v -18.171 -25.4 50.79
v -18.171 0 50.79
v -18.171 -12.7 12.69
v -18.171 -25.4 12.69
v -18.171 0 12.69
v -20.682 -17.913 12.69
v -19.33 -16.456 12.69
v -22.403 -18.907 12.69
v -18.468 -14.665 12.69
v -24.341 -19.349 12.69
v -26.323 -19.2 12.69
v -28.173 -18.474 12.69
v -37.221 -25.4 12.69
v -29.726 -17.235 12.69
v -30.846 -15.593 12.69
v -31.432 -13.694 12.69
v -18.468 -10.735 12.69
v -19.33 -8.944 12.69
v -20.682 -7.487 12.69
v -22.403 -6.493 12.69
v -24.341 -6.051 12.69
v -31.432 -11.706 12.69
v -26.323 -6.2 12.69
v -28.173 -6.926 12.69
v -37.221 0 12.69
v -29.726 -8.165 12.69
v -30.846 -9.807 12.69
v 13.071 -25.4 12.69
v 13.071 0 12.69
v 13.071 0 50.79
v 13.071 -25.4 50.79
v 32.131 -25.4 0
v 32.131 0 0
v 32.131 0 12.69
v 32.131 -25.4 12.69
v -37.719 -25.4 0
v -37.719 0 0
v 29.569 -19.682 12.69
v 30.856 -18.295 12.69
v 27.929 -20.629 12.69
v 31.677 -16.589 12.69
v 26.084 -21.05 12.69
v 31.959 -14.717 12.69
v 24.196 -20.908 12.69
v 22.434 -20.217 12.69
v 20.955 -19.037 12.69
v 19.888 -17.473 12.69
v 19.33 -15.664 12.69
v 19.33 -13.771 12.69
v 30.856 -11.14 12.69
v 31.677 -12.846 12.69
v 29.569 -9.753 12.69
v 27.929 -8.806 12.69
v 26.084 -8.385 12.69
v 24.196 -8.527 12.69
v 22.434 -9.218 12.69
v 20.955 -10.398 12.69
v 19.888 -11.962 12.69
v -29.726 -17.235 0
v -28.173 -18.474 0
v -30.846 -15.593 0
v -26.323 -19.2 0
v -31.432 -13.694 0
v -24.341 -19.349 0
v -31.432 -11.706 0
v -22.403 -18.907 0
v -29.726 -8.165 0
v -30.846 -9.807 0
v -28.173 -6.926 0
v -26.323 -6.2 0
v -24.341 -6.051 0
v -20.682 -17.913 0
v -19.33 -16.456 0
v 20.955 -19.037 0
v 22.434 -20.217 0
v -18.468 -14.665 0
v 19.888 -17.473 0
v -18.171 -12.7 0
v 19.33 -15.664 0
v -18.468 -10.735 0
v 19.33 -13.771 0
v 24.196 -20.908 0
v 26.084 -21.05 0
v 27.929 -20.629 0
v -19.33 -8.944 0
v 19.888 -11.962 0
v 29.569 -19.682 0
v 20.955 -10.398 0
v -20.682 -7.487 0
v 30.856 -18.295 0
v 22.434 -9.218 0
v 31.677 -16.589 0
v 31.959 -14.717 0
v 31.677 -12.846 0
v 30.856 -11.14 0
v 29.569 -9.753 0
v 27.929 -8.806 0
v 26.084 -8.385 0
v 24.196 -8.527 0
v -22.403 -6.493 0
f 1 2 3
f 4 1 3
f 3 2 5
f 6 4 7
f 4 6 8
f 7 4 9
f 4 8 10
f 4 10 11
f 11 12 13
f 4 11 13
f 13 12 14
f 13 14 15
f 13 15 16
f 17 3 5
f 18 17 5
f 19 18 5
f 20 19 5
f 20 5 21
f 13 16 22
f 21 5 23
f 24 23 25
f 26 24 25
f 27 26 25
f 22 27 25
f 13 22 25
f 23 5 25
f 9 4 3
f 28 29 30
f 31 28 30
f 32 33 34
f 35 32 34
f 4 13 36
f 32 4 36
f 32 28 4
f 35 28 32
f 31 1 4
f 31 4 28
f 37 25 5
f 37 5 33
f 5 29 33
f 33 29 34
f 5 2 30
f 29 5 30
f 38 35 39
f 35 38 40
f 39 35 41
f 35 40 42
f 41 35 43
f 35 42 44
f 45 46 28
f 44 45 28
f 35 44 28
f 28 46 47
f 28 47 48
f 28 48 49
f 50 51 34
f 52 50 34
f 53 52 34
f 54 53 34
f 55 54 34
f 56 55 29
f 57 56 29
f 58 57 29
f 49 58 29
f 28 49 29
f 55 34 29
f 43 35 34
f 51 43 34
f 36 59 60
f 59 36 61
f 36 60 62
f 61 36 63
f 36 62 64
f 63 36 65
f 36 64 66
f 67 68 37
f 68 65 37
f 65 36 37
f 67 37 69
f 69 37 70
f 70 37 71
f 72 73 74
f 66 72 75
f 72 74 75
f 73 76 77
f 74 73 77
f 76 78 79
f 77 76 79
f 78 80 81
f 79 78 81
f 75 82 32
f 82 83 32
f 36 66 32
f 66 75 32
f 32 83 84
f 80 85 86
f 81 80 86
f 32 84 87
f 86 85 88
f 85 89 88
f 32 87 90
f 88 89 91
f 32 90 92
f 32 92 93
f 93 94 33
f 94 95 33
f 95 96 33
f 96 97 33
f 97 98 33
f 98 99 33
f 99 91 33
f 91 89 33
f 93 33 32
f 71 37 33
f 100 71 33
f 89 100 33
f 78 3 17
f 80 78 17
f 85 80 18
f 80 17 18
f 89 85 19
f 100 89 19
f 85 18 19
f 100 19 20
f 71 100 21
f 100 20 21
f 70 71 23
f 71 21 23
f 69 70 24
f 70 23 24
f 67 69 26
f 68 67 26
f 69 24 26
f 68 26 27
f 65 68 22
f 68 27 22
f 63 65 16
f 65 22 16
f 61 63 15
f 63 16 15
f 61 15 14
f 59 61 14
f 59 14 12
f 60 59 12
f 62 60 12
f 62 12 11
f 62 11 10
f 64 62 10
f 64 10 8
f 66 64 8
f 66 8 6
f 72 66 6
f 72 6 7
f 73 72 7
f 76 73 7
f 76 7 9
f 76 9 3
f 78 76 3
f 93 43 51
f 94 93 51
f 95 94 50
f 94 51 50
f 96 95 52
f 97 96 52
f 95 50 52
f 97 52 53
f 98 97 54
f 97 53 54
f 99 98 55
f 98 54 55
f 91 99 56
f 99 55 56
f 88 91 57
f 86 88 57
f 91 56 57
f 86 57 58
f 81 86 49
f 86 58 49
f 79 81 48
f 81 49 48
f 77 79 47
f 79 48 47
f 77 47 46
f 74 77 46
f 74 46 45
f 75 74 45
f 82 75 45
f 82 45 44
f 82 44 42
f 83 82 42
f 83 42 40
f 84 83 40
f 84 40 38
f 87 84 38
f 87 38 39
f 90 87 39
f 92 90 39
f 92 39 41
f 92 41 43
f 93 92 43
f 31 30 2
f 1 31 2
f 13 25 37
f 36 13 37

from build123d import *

# Parameters (mm, degrees)
F1_DEPTH = 25.4
F2_R     = 6.6675
F3_DEPTH = 12.7
F4_R     = 6.35
F5_DEPTH = 12.7


with BuildPart() as f1:
    # F0 (on Front) → F1 (new body)
    with BuildSketch(Plane.XZ):
        Polygon((-37.221345, 12.690246), (-37.719001, 0), (32.130999, 0), (32.130999, 12.690246), (13.070659, 12.690246), (13.070659, 50.790246), (-18.171345, 50.790246), (-18.171345, 12.690246), align=None)
    extrude(amount=F1_DEPTH)

    # F2 (on face) → F3 (cut)
    with BuildSketch(Plane.XY.offset(12.690246)):
        with Locations((-24.838845, -12.7)):
            Circle(F2_R)
    extrude(amount=-F3_DEPTH, mode=Mode.SUBTRACT)

    # F4 (on face) → F5 (cut)
    with BuildSketch(Plane.XY.offset(12.690246)):
        with Locations((25.609393, -14.717459)):
            Circle(F4_R)
    extrude(amount=-F5_DEPTH, mode=Mode.SUBTRACT)


solid = f1.part
